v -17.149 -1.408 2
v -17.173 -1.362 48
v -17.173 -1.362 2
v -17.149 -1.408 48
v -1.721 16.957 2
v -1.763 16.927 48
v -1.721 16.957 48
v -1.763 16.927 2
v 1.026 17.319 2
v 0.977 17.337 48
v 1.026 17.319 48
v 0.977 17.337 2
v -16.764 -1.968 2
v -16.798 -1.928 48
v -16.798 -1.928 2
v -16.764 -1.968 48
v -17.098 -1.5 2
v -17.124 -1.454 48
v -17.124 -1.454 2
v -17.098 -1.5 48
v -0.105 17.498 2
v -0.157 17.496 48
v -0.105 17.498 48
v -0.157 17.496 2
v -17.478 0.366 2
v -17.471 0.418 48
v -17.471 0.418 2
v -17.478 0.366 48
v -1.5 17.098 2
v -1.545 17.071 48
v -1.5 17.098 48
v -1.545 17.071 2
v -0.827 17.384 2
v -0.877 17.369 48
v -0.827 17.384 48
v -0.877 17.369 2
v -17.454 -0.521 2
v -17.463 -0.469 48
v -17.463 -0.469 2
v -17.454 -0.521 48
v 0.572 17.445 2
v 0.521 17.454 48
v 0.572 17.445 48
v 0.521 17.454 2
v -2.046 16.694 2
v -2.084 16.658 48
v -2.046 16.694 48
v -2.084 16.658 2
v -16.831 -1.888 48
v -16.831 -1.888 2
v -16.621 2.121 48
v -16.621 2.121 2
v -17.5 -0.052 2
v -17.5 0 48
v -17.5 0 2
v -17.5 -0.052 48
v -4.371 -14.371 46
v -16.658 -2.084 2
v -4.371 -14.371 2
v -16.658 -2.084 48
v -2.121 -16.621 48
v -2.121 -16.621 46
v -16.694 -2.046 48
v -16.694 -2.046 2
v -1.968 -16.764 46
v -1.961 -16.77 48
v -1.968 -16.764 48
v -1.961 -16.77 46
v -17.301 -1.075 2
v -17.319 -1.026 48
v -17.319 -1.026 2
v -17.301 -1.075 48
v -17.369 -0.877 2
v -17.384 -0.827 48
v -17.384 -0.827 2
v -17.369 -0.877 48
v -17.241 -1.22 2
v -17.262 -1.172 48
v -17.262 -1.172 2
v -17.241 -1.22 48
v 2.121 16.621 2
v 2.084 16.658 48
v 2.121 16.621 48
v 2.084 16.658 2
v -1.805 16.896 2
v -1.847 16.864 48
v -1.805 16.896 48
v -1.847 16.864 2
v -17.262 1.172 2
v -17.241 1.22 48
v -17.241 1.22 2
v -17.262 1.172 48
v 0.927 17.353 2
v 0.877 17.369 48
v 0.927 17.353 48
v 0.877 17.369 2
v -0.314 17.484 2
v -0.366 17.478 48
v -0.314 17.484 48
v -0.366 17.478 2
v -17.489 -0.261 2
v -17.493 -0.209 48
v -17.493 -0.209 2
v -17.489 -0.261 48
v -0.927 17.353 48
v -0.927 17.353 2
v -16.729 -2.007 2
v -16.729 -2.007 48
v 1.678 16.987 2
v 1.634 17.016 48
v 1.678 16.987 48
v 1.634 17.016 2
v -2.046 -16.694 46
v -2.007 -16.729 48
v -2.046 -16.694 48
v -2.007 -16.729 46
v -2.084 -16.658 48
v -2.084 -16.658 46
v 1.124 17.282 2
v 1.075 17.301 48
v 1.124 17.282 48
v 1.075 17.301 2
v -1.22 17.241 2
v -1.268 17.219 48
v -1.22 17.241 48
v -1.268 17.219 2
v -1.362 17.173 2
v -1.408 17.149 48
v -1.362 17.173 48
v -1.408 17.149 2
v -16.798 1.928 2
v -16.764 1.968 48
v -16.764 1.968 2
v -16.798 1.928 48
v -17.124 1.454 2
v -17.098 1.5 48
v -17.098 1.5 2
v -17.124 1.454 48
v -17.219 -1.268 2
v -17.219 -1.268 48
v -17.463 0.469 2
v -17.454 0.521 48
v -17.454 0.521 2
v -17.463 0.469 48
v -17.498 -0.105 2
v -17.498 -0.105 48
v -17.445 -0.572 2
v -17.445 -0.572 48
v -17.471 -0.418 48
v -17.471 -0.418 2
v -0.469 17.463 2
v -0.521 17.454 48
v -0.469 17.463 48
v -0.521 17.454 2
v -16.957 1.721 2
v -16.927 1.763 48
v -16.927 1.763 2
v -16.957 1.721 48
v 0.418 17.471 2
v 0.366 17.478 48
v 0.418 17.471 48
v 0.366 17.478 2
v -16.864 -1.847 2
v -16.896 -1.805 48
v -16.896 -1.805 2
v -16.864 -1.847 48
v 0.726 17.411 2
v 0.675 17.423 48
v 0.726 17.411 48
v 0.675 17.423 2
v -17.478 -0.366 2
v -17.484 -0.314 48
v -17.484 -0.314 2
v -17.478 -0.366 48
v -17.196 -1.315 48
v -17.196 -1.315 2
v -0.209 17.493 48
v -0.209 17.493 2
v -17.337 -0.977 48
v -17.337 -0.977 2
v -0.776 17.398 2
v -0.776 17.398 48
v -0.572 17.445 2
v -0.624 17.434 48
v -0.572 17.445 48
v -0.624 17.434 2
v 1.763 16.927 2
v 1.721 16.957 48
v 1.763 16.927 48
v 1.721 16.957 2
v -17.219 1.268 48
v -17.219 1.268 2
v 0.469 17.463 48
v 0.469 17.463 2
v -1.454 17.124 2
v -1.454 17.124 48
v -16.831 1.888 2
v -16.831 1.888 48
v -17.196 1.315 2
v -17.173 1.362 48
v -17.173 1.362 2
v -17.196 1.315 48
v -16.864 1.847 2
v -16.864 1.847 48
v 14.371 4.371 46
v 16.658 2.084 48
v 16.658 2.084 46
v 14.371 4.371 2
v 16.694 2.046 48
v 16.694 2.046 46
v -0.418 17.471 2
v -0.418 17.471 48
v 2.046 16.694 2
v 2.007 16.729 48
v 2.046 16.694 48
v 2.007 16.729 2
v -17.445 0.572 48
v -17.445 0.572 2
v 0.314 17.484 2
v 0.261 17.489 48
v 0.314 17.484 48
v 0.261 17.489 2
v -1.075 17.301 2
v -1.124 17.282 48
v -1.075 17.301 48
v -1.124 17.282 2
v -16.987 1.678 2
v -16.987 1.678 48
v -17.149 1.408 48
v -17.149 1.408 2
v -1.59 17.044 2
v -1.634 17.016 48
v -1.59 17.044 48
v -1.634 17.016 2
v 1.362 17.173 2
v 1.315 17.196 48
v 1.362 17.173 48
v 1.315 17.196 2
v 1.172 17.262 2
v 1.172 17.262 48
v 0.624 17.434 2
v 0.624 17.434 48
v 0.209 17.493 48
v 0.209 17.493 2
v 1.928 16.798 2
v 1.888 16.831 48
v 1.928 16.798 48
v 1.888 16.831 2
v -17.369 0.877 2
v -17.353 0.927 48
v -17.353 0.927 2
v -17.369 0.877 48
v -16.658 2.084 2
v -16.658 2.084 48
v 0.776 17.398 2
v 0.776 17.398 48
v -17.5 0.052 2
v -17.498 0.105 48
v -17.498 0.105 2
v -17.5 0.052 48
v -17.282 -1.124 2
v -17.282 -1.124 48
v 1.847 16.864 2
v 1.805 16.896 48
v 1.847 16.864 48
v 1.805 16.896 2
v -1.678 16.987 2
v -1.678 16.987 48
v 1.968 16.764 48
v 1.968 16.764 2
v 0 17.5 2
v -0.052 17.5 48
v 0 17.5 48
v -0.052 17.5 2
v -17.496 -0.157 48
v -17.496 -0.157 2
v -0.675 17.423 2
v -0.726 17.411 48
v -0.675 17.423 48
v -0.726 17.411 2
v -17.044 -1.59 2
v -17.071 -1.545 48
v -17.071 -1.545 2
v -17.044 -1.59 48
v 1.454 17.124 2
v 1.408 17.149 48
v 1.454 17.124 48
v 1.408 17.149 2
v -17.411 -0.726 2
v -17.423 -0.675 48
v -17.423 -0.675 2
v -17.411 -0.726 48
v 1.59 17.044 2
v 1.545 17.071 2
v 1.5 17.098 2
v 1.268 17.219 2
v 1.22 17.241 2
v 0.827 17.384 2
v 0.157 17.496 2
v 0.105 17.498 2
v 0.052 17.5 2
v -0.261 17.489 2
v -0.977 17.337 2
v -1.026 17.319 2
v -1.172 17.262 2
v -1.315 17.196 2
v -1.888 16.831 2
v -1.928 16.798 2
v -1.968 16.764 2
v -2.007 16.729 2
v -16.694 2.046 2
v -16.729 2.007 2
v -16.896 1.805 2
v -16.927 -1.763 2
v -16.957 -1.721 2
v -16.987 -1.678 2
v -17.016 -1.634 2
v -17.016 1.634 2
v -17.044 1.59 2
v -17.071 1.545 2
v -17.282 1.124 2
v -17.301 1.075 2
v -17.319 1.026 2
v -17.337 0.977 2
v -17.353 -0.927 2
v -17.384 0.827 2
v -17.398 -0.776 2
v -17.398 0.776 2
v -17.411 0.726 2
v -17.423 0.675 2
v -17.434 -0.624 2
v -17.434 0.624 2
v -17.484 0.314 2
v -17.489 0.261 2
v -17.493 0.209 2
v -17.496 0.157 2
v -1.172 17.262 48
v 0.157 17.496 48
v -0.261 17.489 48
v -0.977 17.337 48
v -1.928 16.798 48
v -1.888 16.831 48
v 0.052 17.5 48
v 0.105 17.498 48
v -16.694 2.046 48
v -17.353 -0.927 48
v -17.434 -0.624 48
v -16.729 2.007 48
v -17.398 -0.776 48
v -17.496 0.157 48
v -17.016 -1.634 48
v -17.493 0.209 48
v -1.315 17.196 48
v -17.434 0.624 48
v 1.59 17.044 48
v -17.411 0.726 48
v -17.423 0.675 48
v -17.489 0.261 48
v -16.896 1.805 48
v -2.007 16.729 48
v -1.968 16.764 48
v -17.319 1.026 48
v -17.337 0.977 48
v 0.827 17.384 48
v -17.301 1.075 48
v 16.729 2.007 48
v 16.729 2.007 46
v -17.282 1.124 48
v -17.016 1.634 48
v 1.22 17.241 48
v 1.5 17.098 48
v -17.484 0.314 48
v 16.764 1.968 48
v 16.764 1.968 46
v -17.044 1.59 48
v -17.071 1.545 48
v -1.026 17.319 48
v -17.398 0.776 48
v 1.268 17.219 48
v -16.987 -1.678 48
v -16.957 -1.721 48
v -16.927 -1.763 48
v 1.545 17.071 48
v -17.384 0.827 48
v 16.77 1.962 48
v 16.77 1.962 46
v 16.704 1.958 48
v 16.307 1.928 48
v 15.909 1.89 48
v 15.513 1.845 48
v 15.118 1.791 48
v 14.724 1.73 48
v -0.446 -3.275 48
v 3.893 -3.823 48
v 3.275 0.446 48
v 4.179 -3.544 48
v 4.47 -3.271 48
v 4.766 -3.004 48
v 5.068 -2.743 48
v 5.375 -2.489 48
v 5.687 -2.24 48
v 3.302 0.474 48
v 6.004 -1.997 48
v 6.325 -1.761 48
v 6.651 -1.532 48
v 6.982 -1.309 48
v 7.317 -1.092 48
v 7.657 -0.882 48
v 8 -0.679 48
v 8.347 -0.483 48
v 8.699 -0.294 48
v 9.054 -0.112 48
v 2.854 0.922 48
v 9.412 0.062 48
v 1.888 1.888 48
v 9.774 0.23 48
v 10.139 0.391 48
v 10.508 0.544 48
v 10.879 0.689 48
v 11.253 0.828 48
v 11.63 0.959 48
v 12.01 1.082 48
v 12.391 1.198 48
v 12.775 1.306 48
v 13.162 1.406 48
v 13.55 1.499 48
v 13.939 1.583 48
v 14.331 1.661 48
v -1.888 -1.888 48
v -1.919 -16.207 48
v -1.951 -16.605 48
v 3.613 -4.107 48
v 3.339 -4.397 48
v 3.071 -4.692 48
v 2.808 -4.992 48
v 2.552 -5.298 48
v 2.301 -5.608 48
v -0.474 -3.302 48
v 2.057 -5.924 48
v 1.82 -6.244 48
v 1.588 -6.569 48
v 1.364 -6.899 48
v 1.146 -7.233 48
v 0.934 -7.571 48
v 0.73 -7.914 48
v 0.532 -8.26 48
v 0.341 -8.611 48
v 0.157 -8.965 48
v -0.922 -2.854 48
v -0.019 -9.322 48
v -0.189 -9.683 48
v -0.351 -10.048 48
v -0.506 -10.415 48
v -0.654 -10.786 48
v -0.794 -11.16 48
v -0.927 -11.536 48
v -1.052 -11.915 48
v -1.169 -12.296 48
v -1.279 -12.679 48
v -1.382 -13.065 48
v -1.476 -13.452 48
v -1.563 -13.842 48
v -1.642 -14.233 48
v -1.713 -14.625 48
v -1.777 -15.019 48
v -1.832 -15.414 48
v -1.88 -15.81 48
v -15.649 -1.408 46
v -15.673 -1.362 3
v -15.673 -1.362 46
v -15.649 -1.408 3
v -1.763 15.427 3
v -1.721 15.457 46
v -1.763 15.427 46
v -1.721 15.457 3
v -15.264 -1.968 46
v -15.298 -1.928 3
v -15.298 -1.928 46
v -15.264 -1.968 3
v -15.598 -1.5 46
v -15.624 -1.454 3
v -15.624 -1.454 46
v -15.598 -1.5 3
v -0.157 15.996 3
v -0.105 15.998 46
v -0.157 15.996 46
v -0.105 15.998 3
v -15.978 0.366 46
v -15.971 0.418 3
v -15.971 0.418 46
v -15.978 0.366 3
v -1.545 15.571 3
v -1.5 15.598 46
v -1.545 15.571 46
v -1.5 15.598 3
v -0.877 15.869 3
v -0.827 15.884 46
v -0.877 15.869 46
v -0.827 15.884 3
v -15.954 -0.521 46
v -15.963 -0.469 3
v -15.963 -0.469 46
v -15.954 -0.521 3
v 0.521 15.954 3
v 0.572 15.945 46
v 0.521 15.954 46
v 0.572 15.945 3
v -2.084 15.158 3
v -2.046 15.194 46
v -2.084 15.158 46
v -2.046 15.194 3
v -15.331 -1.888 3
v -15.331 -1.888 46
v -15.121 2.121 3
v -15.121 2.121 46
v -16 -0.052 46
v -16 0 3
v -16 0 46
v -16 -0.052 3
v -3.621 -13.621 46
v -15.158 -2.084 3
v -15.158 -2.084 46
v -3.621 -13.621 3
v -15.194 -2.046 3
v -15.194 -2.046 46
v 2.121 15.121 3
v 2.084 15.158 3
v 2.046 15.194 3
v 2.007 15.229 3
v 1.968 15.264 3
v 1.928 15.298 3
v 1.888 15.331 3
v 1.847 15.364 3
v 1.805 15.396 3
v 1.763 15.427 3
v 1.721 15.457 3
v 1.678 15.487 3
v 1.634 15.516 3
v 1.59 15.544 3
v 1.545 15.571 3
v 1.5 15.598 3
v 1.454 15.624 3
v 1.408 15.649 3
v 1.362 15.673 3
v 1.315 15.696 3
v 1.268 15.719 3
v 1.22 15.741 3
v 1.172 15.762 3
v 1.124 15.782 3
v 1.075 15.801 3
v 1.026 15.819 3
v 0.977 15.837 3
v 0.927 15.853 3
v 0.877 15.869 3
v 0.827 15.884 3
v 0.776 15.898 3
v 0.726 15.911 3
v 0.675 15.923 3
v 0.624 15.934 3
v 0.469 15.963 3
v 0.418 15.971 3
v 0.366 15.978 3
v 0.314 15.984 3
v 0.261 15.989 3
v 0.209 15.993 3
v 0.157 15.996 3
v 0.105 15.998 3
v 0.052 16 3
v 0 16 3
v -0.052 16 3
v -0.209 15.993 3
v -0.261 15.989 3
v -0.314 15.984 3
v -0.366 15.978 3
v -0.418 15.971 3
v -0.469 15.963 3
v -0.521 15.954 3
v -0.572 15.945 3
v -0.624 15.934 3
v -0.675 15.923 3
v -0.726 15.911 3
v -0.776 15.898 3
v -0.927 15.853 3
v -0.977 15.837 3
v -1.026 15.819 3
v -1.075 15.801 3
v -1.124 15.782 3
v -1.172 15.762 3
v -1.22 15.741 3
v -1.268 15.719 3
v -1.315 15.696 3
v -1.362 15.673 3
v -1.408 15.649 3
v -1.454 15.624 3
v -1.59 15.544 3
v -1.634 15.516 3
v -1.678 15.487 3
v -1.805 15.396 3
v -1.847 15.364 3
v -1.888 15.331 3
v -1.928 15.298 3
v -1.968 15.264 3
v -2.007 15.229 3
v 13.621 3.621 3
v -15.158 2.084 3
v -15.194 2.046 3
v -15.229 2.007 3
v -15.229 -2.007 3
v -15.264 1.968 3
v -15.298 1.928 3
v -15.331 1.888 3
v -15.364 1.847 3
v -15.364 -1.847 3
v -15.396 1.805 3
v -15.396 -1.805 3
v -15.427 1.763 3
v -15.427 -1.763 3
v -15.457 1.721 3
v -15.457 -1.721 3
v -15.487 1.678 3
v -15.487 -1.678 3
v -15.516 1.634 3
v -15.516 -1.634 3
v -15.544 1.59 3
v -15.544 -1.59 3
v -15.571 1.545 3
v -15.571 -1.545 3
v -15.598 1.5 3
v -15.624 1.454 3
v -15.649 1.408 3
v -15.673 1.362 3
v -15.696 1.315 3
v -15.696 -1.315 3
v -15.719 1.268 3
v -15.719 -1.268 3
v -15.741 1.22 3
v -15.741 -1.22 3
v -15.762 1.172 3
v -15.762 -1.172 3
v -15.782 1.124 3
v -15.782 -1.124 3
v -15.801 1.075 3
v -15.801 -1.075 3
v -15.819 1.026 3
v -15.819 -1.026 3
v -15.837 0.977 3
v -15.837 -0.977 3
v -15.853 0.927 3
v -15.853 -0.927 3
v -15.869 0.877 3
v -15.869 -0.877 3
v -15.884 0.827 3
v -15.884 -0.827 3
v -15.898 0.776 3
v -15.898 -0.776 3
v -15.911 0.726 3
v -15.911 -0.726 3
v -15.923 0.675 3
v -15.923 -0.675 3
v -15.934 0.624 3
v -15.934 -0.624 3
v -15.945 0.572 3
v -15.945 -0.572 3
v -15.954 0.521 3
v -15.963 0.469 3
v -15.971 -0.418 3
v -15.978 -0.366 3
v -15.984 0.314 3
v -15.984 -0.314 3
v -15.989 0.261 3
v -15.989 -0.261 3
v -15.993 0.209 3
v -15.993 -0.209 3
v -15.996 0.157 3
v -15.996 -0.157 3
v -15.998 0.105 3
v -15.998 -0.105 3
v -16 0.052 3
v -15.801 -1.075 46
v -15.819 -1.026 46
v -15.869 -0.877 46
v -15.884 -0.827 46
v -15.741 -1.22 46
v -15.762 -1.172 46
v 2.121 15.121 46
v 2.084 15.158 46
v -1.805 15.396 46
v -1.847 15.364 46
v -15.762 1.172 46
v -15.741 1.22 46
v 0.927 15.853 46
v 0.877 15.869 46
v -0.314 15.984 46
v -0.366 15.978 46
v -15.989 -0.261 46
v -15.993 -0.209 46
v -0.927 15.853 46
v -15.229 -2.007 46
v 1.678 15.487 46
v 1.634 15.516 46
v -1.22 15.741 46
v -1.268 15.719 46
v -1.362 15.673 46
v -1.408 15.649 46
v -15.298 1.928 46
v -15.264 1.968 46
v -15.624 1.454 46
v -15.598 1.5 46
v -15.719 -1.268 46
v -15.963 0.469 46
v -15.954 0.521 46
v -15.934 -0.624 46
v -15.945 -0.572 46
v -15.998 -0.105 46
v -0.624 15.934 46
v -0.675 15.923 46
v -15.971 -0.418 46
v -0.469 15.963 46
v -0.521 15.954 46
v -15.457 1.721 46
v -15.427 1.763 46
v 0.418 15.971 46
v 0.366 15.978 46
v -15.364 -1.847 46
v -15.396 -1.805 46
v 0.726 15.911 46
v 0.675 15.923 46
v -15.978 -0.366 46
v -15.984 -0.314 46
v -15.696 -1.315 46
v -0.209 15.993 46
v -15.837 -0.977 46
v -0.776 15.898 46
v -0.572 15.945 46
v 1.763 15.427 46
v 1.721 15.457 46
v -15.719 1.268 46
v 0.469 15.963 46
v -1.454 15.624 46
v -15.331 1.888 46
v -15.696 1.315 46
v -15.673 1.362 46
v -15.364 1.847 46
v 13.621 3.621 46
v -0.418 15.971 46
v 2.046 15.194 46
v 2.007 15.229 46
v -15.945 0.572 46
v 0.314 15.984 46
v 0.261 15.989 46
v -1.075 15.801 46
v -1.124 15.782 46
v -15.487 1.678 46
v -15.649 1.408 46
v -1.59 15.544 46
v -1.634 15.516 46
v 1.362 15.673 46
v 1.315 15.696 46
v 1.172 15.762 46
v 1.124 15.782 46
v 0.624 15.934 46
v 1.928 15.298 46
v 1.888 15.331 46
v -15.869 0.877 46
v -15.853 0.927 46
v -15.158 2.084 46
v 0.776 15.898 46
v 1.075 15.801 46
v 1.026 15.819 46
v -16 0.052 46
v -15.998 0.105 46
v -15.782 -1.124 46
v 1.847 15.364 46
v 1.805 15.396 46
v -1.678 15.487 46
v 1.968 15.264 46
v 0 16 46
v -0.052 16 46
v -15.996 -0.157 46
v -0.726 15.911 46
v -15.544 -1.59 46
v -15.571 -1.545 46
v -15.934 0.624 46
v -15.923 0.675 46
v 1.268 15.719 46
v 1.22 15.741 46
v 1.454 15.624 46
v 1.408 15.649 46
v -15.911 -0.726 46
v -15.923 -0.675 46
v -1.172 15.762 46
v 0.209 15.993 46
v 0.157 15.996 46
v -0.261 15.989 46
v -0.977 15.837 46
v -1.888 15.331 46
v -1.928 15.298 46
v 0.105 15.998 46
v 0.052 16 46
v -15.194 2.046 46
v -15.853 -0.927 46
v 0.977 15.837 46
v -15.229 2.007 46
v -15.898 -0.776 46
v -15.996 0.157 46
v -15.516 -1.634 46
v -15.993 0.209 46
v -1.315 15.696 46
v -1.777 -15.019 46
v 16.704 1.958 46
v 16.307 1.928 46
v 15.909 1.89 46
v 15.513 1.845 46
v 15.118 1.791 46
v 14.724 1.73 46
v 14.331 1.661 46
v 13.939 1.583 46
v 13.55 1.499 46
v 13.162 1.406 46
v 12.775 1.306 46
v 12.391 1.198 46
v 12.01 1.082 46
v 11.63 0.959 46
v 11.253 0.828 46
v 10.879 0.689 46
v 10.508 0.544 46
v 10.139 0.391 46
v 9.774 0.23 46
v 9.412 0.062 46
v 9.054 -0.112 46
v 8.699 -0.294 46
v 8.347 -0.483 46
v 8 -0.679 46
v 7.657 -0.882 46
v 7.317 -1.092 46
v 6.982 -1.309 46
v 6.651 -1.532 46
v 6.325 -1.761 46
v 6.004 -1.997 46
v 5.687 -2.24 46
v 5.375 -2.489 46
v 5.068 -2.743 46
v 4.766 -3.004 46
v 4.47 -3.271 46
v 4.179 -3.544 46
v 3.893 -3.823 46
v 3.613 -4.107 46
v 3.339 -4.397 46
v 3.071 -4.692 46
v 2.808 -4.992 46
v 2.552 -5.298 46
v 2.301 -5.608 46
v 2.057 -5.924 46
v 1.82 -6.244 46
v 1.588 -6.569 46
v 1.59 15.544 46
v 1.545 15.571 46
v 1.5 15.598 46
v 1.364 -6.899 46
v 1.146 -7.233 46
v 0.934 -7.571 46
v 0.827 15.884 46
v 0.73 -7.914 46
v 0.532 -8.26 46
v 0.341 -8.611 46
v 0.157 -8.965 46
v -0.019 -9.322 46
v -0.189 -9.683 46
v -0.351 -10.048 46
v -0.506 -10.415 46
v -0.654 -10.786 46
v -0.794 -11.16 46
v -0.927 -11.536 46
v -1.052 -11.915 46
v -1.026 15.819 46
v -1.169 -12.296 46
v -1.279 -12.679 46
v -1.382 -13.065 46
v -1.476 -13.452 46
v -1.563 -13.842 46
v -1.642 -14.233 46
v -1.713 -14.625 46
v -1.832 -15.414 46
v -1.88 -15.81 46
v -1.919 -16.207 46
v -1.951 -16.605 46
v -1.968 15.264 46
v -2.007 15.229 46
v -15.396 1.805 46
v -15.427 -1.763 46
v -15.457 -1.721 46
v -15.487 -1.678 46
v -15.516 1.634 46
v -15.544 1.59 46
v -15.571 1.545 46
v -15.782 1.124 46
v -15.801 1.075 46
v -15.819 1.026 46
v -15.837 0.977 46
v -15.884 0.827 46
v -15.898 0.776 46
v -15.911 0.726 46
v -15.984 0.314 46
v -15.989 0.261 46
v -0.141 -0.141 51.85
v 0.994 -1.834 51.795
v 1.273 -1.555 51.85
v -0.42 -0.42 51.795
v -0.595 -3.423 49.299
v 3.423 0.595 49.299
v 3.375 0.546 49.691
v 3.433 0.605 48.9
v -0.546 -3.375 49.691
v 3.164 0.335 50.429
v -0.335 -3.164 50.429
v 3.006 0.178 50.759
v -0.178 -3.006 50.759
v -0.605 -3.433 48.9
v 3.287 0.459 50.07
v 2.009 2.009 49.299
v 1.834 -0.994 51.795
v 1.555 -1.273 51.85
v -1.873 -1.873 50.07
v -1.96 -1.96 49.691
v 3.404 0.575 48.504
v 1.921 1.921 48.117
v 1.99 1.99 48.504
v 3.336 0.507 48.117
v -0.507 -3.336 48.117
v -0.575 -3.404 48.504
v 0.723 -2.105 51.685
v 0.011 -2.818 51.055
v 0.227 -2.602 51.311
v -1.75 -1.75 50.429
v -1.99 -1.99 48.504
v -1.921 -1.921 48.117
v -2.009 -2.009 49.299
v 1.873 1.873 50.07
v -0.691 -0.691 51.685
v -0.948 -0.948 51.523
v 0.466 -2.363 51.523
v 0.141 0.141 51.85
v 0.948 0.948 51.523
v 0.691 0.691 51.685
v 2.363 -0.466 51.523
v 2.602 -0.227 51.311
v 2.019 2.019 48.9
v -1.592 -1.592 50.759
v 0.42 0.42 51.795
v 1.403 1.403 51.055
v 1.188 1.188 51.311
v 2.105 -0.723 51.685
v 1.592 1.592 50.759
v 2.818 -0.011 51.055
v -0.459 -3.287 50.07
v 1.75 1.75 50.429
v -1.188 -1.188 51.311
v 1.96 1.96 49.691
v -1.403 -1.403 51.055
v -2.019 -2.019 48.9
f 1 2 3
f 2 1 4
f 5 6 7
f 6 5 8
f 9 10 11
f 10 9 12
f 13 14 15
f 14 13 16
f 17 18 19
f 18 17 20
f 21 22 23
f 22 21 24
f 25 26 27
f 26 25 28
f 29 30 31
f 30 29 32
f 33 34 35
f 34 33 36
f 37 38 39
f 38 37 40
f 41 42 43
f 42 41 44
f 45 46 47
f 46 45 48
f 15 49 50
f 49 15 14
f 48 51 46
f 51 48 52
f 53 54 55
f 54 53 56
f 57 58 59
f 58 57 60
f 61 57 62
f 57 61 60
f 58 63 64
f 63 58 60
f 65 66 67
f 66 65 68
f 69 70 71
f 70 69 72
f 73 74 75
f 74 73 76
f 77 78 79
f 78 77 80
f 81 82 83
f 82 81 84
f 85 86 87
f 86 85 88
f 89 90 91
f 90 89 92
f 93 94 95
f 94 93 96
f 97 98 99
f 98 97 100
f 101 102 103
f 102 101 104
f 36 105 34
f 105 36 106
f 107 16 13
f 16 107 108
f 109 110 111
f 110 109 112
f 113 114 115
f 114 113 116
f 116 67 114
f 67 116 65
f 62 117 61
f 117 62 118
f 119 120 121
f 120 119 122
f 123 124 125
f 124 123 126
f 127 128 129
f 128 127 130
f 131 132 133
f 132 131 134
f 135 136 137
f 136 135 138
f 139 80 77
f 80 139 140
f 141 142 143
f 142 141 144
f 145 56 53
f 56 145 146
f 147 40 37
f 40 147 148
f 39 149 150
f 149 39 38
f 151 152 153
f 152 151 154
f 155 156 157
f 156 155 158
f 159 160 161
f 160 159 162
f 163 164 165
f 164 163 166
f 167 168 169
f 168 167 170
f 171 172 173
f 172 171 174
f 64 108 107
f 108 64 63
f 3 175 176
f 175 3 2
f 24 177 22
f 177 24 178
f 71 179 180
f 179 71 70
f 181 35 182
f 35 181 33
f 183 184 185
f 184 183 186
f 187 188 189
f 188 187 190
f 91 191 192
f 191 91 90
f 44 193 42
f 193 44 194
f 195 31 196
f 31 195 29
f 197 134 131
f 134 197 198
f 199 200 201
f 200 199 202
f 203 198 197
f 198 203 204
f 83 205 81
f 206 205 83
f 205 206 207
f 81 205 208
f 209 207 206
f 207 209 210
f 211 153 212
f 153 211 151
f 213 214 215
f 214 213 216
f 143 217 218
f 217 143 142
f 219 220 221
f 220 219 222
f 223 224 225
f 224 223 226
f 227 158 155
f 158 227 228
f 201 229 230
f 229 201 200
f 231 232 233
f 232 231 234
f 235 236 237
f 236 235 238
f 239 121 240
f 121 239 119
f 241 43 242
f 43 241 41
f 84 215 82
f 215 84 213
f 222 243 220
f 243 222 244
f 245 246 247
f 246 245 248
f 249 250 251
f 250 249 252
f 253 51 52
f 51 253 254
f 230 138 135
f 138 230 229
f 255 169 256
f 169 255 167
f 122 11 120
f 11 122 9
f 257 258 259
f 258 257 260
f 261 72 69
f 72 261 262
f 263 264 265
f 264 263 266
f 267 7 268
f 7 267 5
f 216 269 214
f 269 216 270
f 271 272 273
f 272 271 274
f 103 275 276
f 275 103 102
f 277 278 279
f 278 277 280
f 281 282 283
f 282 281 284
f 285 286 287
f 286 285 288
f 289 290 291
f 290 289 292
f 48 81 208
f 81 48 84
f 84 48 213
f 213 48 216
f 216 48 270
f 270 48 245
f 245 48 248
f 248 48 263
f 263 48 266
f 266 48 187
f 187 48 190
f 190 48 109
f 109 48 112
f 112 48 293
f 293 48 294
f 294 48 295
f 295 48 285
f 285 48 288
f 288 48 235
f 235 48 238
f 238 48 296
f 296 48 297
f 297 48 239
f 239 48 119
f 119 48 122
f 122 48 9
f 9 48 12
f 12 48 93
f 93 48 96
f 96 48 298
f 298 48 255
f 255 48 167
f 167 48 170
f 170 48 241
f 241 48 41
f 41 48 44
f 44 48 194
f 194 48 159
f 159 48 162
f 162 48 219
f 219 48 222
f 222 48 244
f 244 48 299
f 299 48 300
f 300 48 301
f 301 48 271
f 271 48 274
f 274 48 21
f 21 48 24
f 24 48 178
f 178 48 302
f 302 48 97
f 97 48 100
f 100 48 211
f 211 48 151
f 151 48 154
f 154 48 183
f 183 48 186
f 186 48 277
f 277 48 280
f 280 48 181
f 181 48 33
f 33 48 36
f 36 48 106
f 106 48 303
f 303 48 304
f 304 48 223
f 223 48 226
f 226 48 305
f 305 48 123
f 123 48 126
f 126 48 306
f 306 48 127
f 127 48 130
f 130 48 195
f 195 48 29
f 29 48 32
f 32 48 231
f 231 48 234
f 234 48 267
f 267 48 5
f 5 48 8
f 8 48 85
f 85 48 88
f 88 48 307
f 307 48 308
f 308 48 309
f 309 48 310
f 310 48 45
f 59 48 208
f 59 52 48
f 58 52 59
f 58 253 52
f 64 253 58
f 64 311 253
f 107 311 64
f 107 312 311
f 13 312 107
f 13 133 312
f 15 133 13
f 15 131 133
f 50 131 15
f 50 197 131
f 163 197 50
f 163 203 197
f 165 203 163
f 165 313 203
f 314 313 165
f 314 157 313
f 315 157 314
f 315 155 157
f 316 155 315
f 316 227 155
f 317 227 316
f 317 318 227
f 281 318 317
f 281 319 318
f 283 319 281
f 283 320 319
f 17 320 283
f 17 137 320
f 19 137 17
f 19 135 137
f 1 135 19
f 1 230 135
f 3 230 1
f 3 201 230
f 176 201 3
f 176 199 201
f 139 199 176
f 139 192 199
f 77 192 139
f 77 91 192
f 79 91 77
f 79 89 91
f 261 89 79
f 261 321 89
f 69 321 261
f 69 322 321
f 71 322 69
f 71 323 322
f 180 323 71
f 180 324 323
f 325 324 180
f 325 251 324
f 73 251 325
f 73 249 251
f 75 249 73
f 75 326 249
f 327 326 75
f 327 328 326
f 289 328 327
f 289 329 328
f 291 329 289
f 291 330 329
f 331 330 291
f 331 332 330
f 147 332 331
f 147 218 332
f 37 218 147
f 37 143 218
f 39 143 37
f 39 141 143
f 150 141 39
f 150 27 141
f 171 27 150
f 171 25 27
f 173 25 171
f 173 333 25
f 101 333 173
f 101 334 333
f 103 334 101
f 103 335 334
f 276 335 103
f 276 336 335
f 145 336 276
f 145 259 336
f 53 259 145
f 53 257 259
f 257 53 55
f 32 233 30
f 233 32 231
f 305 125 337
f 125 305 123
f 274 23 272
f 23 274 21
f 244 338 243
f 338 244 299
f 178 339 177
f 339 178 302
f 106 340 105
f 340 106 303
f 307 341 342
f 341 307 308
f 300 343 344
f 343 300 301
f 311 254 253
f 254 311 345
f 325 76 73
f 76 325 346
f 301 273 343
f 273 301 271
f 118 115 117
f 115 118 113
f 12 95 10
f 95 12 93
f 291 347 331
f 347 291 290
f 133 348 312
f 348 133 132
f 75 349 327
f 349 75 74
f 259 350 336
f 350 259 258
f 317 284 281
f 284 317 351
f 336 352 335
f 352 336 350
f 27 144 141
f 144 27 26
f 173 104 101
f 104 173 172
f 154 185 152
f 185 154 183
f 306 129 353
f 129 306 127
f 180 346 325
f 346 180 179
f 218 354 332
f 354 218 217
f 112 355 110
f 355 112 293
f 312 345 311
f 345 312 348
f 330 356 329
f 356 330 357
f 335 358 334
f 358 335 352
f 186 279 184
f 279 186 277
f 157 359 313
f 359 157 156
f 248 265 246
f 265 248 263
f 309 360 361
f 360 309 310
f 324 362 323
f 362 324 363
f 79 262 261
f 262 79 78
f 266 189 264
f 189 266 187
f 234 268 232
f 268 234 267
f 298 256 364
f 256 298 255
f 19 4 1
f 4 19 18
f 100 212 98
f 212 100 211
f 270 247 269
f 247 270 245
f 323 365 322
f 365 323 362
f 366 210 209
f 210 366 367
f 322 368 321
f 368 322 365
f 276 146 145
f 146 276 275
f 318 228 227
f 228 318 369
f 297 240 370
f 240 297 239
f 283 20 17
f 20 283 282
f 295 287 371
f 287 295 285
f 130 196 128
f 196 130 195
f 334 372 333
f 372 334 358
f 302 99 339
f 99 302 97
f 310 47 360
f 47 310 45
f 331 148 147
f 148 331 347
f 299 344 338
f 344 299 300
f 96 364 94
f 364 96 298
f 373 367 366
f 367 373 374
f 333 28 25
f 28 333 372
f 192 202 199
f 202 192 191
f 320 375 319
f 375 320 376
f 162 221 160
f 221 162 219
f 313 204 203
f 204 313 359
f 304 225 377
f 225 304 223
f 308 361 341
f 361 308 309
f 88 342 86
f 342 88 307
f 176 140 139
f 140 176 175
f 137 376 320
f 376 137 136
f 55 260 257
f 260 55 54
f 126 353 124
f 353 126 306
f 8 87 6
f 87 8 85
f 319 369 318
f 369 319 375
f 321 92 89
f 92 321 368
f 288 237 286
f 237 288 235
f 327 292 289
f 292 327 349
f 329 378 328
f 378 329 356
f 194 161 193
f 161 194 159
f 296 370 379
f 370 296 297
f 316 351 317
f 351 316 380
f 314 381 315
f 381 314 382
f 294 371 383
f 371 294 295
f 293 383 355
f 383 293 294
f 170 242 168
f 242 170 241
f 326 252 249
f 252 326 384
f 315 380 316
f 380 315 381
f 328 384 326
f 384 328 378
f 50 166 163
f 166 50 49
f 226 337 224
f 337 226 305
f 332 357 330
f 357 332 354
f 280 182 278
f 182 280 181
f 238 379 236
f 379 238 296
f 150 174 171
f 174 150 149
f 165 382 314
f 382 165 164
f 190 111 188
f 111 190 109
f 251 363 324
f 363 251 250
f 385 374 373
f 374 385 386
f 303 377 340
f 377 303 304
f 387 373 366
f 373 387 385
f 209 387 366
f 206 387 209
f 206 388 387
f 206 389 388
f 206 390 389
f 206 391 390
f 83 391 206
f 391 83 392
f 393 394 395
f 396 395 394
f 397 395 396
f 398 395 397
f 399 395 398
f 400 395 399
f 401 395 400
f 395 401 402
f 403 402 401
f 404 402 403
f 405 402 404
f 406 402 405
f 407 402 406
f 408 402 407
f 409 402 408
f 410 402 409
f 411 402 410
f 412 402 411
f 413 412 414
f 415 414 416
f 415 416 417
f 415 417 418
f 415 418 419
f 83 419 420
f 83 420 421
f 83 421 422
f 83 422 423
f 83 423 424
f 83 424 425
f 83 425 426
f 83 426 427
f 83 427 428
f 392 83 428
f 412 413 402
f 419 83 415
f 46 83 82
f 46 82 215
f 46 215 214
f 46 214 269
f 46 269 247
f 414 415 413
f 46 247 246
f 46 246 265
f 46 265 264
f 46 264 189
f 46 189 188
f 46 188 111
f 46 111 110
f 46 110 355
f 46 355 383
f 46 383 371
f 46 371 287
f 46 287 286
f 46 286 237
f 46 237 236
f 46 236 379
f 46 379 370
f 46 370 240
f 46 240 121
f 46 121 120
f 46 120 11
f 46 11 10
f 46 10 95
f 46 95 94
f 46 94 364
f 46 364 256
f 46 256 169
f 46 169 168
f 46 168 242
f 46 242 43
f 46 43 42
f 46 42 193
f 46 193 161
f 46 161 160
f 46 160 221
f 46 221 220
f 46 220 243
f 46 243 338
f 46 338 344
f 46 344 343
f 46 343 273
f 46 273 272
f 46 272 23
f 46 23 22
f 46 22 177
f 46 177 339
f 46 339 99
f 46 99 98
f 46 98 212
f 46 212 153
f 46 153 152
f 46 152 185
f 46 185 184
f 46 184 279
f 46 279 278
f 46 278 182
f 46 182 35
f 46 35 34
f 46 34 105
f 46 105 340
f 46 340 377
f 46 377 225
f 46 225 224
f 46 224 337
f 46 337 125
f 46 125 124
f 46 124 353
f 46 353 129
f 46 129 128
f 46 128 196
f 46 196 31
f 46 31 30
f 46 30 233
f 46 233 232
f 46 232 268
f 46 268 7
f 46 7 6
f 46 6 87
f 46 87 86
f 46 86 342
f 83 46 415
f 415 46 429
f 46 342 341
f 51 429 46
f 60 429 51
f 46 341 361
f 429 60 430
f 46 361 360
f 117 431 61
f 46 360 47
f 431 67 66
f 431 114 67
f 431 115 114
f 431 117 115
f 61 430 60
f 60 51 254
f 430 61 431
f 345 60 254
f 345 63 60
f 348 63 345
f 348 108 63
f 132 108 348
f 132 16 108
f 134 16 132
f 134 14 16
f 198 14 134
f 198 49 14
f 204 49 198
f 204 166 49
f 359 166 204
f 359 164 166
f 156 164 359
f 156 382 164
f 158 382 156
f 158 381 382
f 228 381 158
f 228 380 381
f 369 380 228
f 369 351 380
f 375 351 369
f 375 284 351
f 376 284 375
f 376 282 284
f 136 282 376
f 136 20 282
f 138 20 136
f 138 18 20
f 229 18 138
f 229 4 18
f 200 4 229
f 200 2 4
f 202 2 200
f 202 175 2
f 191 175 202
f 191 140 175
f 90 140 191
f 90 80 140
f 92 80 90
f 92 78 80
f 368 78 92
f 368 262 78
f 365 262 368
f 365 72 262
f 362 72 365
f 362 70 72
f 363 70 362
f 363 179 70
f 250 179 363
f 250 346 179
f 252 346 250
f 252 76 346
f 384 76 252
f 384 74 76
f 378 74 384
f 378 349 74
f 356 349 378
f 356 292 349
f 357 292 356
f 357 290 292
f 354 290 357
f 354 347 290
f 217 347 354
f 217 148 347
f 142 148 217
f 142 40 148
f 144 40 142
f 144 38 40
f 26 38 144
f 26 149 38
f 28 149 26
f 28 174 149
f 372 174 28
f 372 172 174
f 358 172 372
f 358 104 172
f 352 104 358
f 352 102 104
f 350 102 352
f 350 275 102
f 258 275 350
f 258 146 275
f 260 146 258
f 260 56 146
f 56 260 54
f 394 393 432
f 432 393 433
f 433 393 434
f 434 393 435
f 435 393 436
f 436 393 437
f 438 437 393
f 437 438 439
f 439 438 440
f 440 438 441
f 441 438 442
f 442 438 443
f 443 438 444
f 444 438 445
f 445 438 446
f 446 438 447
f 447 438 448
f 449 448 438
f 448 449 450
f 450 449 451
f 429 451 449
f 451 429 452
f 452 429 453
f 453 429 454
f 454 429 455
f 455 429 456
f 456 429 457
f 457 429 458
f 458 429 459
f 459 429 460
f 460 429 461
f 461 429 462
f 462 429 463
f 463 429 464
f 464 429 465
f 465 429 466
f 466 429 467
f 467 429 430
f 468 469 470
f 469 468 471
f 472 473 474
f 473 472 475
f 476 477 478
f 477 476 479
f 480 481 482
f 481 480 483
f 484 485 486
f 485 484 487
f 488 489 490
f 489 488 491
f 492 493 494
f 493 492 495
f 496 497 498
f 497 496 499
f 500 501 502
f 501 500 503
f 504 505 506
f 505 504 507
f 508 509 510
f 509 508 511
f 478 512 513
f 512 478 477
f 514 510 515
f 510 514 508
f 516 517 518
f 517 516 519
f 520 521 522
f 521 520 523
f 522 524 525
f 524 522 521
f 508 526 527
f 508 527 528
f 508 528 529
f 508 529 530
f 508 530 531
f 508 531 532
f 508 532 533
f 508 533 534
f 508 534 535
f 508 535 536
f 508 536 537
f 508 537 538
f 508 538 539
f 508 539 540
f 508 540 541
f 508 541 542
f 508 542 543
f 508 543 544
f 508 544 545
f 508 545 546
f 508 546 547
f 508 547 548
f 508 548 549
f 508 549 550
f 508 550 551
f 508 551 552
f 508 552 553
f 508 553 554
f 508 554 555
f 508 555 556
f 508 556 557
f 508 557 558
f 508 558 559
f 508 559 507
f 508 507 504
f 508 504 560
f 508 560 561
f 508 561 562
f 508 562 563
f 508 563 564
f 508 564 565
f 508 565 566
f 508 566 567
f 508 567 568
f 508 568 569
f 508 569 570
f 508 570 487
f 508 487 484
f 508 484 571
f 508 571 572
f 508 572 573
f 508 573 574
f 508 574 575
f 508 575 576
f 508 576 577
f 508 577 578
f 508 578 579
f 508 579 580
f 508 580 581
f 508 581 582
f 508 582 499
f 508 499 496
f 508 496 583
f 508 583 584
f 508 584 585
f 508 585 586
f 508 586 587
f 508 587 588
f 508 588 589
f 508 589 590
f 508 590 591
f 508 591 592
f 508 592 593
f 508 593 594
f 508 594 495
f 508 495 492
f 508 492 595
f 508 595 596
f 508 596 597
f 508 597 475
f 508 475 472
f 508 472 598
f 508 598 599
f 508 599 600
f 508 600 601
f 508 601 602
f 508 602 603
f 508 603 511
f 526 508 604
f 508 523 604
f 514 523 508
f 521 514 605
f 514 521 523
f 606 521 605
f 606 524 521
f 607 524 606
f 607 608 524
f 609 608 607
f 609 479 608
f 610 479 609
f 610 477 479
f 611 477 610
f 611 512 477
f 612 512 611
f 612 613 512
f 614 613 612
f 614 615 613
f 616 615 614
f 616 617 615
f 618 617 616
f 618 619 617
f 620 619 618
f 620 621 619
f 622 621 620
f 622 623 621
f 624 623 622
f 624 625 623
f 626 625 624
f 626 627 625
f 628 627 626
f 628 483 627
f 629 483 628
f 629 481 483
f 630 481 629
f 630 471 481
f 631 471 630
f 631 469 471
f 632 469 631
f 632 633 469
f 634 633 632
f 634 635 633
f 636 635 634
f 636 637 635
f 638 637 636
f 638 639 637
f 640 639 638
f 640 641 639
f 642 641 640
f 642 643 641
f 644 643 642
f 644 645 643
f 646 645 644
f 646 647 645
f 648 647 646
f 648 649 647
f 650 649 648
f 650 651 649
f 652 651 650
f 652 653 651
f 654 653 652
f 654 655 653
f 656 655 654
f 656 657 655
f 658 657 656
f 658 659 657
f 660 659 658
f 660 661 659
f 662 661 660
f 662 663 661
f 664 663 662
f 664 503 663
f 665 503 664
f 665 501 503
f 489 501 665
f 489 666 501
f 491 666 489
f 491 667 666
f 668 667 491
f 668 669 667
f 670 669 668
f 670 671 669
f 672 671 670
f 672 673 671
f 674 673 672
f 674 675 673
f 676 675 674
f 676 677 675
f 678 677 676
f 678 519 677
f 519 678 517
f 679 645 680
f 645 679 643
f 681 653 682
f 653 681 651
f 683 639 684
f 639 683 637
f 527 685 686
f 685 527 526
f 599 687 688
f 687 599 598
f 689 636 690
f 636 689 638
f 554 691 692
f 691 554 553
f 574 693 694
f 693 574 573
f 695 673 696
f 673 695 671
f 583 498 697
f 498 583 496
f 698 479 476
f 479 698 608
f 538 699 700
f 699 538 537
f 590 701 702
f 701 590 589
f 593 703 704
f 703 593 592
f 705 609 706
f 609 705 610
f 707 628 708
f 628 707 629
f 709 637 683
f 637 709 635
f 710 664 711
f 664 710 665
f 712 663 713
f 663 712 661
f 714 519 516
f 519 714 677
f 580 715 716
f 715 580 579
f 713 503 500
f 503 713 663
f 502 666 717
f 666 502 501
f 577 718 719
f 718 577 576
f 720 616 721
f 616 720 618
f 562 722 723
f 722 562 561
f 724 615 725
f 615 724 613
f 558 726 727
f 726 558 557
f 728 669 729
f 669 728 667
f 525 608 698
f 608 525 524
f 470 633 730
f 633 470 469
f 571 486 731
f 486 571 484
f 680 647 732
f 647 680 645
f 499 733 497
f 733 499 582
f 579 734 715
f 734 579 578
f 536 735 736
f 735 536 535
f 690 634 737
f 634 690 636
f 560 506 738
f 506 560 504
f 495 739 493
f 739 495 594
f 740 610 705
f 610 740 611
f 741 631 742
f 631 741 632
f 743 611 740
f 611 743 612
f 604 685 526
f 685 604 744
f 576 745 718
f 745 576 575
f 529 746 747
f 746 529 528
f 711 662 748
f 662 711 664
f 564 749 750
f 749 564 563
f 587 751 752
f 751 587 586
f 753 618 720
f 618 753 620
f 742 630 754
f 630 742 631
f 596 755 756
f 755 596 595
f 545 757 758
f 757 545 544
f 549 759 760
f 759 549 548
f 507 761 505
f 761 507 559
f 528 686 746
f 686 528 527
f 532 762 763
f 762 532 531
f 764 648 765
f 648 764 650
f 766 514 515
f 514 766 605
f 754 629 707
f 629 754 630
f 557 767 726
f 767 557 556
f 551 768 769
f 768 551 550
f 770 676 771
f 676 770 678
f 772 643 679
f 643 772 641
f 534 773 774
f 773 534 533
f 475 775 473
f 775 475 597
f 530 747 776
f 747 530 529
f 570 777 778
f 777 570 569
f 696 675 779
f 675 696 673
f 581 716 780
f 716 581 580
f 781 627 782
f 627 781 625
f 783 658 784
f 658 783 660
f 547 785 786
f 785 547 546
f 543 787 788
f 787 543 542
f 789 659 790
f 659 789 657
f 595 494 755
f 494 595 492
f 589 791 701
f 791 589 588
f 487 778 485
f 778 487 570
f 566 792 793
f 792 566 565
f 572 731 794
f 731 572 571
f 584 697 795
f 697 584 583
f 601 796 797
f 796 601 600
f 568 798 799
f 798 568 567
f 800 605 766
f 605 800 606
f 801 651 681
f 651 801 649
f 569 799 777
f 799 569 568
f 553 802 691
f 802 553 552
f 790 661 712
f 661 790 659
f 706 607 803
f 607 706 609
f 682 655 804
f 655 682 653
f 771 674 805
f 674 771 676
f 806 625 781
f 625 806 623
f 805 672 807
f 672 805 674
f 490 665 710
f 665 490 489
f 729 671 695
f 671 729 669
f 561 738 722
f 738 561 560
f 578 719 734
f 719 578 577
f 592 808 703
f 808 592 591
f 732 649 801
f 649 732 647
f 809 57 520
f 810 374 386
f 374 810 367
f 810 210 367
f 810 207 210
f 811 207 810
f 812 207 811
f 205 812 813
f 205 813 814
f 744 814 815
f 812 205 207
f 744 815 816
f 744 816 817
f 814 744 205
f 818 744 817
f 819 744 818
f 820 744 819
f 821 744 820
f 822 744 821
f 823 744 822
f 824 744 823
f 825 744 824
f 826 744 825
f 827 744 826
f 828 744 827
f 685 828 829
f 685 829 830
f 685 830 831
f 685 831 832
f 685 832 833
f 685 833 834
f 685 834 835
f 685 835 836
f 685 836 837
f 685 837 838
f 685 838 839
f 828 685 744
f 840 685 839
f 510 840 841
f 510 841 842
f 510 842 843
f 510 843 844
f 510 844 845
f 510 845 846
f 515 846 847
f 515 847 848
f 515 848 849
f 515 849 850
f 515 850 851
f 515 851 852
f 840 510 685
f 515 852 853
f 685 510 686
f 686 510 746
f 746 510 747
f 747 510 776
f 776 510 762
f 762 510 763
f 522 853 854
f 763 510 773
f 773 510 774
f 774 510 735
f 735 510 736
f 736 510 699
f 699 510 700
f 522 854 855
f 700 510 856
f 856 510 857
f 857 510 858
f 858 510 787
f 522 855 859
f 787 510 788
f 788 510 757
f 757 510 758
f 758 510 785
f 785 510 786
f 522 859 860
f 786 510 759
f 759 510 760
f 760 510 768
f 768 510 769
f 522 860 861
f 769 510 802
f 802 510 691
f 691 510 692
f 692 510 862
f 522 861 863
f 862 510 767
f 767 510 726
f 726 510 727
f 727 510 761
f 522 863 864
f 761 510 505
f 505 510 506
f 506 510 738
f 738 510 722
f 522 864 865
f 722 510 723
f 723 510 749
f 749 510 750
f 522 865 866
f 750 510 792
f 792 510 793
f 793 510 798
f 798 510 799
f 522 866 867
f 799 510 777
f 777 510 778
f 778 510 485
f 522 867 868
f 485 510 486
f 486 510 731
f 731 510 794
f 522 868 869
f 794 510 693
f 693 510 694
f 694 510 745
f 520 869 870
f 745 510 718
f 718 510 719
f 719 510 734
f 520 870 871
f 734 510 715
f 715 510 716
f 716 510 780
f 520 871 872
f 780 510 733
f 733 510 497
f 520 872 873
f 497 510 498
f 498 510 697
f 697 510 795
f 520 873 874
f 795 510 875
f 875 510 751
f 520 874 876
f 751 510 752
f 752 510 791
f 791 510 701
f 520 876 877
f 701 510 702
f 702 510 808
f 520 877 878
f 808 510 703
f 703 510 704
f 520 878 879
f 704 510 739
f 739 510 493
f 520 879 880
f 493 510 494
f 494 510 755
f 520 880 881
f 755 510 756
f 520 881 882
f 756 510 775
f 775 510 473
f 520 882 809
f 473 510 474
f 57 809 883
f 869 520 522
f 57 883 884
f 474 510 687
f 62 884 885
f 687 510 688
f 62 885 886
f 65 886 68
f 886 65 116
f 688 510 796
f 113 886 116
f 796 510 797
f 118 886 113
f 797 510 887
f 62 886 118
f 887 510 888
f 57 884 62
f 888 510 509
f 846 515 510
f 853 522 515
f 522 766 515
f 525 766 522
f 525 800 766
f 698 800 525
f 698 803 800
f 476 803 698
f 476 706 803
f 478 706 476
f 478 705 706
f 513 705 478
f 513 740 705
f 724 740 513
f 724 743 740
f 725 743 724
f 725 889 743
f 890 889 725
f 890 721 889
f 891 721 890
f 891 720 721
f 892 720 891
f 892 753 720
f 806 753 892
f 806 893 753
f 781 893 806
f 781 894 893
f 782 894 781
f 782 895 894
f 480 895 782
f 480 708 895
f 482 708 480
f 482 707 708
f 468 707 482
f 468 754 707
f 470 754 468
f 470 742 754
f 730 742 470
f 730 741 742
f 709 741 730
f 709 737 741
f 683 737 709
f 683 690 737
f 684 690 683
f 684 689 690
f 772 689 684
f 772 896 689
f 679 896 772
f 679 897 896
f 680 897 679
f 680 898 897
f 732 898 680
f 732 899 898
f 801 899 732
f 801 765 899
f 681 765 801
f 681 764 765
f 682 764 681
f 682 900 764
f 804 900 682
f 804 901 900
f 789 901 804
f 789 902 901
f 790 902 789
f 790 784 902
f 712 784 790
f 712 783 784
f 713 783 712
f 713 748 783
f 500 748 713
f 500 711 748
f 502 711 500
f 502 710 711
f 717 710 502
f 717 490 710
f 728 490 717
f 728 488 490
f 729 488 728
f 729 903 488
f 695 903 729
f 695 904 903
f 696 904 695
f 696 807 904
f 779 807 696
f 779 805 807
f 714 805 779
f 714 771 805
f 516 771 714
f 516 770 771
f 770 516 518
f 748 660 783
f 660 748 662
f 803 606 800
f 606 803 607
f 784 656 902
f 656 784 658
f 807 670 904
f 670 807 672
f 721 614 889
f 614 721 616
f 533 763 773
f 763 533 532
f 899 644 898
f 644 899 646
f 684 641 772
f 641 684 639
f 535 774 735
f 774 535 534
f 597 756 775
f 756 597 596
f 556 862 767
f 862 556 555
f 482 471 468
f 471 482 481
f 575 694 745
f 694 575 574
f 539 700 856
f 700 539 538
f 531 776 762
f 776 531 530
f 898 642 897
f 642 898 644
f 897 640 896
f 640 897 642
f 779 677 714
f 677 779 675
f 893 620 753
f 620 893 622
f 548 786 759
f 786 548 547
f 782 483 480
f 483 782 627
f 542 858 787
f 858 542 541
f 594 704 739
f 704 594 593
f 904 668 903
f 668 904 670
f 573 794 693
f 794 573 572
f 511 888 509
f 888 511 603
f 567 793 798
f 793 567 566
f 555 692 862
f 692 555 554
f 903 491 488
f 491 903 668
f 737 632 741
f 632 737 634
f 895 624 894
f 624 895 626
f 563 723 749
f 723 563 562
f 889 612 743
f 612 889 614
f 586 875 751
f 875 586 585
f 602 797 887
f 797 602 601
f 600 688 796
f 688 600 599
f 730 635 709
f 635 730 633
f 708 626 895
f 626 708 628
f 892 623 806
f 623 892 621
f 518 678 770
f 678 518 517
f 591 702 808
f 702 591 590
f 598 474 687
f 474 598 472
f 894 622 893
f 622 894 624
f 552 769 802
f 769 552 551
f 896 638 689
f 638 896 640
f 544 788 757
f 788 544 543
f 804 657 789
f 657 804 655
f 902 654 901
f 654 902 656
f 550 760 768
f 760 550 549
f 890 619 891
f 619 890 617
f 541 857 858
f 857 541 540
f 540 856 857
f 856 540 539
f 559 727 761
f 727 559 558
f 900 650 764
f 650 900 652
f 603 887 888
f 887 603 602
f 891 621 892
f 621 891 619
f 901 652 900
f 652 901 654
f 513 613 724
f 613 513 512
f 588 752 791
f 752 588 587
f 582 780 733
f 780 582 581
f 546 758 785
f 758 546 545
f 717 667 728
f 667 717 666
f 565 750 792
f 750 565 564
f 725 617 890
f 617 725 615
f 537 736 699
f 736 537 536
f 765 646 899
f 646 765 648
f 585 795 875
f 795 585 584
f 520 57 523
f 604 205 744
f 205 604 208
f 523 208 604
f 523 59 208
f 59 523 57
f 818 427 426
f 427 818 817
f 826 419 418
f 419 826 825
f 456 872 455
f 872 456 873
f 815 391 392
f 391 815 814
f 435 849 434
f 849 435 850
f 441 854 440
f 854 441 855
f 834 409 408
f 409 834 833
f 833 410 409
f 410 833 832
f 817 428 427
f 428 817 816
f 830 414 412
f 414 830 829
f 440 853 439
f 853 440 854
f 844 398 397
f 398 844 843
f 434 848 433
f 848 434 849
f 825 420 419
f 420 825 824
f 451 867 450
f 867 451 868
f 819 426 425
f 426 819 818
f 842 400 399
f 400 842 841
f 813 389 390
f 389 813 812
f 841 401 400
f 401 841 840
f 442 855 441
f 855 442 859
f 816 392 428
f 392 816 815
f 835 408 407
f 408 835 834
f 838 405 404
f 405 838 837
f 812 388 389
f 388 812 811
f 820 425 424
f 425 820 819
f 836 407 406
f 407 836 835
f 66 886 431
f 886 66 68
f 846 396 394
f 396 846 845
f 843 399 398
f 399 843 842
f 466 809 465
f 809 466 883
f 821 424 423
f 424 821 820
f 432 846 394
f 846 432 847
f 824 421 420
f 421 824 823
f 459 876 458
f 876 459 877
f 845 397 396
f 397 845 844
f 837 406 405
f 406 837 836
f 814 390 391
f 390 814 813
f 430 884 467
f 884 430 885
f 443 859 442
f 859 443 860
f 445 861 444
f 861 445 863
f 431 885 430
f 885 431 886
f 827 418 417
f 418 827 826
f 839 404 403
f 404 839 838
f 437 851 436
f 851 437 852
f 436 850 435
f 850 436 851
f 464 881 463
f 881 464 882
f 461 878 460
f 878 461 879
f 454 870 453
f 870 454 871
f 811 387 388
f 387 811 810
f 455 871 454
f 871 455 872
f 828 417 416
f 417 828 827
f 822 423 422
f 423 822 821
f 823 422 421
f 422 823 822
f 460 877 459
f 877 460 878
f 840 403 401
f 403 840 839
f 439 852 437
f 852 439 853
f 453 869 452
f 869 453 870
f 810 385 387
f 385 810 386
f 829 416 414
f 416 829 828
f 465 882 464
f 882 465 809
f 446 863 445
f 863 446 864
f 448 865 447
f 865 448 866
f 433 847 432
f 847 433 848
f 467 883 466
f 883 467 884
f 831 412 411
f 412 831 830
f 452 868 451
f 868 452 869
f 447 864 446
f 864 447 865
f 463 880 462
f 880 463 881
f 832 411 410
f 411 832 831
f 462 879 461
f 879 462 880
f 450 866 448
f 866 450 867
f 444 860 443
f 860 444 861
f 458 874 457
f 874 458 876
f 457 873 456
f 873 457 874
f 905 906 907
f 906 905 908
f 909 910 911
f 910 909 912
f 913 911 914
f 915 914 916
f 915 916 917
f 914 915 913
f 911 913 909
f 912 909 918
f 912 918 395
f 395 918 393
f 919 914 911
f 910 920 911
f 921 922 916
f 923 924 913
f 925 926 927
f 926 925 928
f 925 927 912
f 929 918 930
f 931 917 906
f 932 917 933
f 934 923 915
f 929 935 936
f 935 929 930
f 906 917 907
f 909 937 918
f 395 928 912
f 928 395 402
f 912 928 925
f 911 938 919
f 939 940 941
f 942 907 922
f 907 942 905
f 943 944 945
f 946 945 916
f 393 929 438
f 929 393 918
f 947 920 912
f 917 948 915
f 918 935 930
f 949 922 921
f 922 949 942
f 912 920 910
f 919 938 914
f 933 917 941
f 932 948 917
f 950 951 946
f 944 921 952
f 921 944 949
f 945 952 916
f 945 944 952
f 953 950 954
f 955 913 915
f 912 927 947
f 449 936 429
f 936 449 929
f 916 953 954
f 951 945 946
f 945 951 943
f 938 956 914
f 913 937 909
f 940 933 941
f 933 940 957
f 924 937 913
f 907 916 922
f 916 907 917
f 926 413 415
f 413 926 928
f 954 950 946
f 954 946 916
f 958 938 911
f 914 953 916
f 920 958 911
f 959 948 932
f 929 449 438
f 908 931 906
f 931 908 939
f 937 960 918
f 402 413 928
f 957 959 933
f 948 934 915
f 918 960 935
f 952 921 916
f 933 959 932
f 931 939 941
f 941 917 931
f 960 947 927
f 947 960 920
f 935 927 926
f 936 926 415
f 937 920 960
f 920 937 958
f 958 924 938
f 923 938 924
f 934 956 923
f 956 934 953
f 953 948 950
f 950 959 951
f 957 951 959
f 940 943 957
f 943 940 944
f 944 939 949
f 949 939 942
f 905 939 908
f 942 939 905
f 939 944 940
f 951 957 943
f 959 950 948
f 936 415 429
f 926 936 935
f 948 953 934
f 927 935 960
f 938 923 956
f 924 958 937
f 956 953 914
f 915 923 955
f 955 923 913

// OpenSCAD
$fa = 1;
$fs = 0.4;

height = 50;
radius = 20;
side = 4;
corner_rad = 3;
open = 1;

module rounded_ngon(num, r, rounding = 0) {
  function v(a) = let (d = 360/num, v = floor((a+d/2)/d)*d) (r-rounding) * [cos(v), sin(v)];
  polygon([for (a=[0:360-1]) v(a) + rounding*[cos(a),sin(a)]]);
}        

module box() {
    difference() {
        linear_extrude(height = height - 7)
            rounded_ngon(num = side, r = radius, rounding = corner_rad);
        
        
        translate([0, 0, 2])
        linear_extrude(height = height - 7)
            rounded_ngon(num = side, r = radius - 2, rounding = corner_rad);
    }

    difference() {
        translate([0, 0, height - 7])
        linear_extrude(height = 5)
            rounded_ngon(num = side, r = radius - 1, rounding = corner_rad);

        translate([0, 0, height - 8])
        linear_extrude(height = 8)
            rounded_ngon(num = side, r = radius - 2, rounding = corner_rad);
    }
}
/*
difference() {
    box();
    
    translate([0, -radius - 2, 0])
        rotate([0, 0, 45])
            cube([(radius + 2) * sqrt(2), (radius + 2) * sqrt(2) / 2, height - 2]);

}
*/
difference() {

    translate([0, 0, 2])
        linear_extrude(height = height - 4)
            rounded_ngon(num = side, r = radius - 2.5, rounding = corner_rad);

    translate([0, 0, 3])    
        linear_extrude(height = height -7)
            rounded_ngon(num = side, r = radius - 4, rounding = corner_rad);
    
    translate([0, -radius - 2, 0])
        rotate([0, 0, 45])
            cube([(radius + 2) * sqrt(2), (radius / 2 + 2) * sqrt(2) / 2, height - 4]);

    if(open)
        translate([radius - 2, -radius + 2, height-10])
            cylinder(10, radius, radius);


}

translate([0, 0, height - 1])
    rotate([45, 90, 0])
        //cube([radius / 3, radius / 8, 5]);
        cylinder(2, radius/7, radius/7);
